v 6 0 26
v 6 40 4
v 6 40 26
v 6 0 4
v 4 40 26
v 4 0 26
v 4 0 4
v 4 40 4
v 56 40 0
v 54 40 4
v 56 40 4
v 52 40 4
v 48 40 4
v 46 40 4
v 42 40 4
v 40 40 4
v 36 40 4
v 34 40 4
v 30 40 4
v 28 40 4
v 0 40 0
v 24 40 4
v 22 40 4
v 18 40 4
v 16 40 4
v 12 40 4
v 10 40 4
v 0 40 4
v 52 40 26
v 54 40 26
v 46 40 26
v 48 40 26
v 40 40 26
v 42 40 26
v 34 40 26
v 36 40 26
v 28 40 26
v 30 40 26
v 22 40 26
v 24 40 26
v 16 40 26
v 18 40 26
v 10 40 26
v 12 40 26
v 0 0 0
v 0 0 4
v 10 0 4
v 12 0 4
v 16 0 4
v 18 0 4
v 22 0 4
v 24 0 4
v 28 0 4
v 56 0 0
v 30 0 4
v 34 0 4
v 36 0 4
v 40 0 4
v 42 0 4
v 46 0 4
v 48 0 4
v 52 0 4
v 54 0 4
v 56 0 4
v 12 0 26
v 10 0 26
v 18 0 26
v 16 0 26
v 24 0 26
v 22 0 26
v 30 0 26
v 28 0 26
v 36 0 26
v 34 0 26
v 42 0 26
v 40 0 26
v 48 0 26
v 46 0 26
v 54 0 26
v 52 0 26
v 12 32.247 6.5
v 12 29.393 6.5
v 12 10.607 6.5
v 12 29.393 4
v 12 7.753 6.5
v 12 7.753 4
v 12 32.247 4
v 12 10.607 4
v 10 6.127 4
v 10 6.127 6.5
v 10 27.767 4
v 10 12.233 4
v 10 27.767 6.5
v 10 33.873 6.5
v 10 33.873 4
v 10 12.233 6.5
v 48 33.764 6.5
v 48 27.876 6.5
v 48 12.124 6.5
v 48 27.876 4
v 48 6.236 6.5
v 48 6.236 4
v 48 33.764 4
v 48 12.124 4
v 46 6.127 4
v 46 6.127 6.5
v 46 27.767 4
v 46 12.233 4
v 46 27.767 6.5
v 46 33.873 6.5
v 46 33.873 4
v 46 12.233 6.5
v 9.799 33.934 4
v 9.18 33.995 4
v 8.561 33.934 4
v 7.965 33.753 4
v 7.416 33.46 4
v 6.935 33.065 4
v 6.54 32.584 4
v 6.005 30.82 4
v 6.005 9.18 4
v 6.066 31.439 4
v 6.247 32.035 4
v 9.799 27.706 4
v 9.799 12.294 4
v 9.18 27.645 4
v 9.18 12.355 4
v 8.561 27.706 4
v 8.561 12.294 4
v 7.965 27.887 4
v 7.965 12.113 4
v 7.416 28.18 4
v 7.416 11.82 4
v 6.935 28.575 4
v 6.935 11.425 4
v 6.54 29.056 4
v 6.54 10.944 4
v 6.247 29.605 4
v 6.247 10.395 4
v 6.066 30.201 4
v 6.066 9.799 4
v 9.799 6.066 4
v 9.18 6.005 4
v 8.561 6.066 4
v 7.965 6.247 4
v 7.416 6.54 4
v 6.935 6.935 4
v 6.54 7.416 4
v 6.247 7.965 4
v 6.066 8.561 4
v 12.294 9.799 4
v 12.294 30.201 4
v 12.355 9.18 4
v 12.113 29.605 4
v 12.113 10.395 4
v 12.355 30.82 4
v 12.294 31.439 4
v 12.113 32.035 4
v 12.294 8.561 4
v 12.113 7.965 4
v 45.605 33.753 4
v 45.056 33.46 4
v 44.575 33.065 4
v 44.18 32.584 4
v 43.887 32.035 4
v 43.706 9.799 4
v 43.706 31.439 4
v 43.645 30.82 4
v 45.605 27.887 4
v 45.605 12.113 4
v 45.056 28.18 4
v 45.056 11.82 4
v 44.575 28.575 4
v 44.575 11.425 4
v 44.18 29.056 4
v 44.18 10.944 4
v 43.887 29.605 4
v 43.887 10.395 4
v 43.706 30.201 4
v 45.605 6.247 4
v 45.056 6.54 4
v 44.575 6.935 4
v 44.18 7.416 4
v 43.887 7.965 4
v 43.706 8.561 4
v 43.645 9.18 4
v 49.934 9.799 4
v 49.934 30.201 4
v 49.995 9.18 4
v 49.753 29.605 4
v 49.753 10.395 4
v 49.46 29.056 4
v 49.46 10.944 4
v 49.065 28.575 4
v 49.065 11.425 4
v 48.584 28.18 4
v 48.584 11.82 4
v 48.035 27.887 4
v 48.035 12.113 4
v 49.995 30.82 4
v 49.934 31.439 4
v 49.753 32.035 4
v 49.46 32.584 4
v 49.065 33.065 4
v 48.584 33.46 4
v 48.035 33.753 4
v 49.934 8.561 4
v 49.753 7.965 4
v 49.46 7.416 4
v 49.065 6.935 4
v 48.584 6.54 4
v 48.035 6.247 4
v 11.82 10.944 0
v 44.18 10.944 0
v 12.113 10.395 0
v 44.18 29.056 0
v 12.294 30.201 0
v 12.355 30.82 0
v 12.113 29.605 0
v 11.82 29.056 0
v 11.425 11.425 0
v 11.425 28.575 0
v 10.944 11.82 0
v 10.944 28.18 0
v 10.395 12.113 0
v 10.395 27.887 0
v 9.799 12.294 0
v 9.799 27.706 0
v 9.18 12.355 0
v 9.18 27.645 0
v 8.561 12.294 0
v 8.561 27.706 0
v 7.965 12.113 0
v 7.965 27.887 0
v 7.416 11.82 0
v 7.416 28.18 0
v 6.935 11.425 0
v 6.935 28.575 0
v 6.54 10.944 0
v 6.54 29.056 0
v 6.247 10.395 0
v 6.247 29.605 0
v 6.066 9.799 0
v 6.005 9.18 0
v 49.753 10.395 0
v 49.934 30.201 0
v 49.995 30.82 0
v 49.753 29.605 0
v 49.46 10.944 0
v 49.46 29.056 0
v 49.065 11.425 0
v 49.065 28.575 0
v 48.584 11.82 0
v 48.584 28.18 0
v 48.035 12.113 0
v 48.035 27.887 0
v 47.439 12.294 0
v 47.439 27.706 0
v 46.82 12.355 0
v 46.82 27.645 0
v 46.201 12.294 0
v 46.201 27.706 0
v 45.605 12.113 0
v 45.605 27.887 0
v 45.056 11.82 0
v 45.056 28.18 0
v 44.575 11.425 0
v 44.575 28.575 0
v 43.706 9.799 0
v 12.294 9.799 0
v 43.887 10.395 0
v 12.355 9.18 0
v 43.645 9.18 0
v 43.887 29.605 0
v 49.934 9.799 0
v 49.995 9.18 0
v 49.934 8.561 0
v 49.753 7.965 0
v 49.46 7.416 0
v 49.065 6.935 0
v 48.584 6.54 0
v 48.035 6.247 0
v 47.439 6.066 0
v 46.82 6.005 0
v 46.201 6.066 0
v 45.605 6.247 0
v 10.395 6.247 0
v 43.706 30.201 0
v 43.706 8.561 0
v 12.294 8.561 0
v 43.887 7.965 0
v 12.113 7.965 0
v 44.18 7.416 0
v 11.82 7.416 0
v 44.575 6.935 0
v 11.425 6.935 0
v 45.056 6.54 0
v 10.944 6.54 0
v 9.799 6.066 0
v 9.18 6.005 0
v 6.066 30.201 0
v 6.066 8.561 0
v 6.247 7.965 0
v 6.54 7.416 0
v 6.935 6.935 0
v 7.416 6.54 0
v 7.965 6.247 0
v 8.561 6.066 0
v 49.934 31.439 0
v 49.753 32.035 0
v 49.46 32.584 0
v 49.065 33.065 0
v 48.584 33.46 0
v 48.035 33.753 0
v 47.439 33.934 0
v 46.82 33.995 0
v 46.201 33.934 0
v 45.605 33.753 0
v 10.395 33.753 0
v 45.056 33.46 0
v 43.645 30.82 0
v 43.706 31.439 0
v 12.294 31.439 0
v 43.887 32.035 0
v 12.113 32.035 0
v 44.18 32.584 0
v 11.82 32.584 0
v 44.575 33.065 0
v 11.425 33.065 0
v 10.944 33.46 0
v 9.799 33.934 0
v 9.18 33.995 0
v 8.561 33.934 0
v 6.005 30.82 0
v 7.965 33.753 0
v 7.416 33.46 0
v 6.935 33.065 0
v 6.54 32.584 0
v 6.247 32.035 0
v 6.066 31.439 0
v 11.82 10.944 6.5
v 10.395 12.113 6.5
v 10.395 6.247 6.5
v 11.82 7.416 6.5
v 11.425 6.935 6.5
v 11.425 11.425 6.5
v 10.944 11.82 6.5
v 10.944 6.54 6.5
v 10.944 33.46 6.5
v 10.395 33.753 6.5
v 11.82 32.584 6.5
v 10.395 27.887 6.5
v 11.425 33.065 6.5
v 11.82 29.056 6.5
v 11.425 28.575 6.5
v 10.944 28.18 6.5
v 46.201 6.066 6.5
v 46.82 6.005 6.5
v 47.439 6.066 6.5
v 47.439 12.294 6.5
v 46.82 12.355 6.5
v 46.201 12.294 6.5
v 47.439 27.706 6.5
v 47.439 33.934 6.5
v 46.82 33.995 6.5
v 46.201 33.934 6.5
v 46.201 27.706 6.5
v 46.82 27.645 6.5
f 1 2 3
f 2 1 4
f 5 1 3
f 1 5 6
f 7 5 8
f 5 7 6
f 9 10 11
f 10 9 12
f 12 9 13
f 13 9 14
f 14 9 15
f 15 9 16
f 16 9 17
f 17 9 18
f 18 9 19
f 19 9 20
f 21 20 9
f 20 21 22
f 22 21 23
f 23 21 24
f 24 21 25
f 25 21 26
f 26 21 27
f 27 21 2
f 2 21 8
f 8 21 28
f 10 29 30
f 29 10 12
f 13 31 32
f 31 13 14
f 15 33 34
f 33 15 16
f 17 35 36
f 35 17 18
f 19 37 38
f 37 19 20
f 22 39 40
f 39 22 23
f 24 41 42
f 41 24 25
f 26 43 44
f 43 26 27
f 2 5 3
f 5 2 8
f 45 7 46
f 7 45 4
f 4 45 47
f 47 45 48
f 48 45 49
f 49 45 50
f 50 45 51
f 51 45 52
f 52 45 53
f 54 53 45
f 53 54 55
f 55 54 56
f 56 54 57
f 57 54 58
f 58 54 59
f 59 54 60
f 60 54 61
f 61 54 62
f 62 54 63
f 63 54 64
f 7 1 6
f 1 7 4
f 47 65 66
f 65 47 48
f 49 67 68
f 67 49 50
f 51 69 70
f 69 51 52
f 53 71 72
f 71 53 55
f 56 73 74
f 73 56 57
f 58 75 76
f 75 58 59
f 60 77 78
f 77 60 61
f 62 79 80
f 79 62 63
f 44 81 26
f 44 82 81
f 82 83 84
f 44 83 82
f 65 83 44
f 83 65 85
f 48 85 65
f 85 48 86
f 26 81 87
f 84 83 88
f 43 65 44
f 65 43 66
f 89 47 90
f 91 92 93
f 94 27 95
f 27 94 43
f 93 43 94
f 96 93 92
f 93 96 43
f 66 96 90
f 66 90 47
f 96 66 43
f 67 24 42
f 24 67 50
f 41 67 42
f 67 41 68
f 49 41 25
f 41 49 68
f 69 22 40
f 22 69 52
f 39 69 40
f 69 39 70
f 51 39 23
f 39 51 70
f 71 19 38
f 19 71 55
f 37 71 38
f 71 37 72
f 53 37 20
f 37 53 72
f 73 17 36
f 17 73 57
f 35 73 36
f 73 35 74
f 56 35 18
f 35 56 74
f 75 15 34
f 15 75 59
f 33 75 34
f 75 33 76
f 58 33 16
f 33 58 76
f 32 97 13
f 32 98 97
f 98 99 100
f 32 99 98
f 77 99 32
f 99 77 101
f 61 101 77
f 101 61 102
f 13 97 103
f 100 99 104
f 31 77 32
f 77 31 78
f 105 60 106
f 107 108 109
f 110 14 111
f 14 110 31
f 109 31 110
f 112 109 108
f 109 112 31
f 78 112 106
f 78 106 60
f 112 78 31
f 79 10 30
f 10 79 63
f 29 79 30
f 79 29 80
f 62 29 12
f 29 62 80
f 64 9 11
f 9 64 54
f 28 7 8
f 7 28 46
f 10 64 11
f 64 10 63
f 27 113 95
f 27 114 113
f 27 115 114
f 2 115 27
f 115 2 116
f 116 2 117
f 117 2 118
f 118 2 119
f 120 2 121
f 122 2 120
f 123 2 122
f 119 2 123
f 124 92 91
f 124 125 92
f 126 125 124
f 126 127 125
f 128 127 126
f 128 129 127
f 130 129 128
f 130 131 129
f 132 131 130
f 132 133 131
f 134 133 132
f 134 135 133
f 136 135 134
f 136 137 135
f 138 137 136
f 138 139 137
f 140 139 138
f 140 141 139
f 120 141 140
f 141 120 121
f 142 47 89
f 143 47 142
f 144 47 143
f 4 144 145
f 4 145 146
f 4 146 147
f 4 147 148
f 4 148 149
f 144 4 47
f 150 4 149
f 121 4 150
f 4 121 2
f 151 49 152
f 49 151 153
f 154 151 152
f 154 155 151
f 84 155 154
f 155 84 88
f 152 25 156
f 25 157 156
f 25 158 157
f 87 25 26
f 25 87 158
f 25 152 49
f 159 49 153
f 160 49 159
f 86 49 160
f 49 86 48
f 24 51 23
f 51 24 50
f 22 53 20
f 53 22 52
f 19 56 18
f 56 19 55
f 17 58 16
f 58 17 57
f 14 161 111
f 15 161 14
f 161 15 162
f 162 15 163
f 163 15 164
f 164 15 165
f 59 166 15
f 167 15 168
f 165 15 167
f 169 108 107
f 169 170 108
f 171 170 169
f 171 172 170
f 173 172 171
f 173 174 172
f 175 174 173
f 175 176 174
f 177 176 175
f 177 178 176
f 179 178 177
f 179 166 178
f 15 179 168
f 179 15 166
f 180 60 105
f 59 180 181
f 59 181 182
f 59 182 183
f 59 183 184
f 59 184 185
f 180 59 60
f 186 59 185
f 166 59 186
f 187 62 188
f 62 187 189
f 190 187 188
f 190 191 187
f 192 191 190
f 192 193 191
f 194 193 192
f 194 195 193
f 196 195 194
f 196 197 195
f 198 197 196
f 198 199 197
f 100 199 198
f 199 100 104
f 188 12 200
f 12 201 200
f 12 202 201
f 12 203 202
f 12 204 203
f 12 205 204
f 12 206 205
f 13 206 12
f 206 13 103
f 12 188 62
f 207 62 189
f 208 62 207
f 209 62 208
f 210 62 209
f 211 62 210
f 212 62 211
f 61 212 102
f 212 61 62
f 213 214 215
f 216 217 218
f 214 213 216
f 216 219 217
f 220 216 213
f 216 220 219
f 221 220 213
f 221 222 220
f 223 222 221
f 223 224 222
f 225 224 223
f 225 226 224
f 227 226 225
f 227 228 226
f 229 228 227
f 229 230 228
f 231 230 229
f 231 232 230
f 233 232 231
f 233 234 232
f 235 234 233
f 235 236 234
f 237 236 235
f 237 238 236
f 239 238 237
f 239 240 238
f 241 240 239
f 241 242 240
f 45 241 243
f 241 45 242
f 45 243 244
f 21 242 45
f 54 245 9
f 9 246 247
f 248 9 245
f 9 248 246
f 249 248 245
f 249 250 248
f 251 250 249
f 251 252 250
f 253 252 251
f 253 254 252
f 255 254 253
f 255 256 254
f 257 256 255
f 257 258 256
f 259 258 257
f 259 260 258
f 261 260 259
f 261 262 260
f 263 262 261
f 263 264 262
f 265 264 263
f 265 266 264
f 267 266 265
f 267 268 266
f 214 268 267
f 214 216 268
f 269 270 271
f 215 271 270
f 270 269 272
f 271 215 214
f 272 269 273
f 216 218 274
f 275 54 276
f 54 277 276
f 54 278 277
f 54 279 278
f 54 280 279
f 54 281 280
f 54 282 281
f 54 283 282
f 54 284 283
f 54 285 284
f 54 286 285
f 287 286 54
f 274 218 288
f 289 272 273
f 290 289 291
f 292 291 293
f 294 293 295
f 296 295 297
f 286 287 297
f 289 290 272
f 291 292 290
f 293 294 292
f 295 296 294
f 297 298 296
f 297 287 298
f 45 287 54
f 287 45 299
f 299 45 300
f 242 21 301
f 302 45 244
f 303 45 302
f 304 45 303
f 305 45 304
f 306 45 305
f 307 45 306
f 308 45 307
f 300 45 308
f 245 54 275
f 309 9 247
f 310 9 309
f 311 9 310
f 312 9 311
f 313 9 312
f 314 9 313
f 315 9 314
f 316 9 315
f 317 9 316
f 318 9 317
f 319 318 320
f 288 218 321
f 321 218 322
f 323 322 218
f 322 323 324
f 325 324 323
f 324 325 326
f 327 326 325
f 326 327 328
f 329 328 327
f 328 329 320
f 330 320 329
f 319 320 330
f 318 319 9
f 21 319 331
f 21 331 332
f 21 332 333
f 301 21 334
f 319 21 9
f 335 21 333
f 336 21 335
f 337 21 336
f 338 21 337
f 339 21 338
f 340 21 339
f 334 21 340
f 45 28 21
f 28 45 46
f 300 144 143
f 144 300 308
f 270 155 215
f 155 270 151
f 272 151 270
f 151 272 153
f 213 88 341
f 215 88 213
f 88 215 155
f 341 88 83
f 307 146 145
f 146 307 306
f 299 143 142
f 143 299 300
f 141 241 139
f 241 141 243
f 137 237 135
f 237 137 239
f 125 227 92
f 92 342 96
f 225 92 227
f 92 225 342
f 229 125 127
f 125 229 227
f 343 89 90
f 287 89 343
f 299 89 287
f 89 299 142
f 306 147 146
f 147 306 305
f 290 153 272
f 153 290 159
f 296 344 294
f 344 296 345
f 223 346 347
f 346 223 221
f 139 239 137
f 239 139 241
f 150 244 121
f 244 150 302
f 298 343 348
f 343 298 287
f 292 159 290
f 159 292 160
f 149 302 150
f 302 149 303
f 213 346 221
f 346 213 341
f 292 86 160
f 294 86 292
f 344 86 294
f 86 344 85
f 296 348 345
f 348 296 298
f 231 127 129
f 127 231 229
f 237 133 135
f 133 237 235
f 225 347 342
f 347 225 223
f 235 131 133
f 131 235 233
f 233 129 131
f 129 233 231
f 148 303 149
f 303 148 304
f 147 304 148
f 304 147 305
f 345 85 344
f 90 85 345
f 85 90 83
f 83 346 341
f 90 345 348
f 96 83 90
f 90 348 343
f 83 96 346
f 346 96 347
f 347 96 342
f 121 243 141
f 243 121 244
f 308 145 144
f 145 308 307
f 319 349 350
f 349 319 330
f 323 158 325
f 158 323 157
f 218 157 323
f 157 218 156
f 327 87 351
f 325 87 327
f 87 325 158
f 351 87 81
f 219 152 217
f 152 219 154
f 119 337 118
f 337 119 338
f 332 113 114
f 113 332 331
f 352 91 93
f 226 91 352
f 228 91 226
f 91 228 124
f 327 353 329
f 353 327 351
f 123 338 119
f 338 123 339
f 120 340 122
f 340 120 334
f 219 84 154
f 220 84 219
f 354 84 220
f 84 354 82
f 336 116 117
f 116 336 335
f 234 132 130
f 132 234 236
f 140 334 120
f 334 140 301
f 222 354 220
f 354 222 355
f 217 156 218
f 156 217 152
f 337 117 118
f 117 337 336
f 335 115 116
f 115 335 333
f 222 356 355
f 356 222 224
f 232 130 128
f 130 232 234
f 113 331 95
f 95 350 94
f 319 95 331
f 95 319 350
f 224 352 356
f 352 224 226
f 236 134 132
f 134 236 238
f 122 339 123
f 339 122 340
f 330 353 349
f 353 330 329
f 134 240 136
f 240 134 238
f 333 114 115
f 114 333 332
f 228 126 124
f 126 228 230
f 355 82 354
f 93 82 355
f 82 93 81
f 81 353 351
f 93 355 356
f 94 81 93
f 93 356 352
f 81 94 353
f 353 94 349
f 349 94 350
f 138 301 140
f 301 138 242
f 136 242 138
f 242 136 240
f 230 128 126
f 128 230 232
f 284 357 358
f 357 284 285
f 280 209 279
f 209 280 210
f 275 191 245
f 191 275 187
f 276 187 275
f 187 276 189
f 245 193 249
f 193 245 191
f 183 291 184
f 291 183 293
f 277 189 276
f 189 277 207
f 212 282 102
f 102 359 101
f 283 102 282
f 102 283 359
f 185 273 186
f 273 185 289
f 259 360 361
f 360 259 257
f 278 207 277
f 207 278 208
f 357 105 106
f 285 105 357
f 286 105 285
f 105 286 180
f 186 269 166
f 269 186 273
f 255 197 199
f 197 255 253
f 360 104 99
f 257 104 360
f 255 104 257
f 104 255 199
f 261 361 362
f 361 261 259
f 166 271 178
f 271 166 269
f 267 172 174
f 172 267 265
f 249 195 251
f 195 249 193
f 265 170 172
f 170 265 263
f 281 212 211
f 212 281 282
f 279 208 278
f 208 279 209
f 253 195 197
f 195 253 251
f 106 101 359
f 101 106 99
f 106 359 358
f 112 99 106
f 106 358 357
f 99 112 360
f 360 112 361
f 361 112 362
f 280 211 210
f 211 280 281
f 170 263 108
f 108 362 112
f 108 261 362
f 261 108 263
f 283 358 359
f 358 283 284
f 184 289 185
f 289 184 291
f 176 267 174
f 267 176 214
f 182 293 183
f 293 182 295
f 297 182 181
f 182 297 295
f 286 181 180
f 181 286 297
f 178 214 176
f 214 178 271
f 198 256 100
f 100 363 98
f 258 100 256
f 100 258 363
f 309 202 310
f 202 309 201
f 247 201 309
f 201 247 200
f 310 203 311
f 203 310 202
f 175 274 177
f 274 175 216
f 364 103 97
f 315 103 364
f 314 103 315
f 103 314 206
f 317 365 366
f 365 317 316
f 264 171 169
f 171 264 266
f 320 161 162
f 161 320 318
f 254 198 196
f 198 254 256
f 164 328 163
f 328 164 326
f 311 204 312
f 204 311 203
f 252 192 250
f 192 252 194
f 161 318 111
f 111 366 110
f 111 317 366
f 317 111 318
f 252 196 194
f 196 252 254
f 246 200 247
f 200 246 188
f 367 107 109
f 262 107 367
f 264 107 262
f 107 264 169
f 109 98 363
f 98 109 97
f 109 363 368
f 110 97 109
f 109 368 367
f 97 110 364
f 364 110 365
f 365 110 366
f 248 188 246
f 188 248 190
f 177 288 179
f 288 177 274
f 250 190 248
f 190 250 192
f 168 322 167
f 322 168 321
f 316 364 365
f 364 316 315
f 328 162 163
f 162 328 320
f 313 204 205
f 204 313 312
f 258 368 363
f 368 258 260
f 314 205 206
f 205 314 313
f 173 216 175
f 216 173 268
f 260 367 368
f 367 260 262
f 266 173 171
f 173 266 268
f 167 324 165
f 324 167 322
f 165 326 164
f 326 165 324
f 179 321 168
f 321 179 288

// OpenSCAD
$fn = 32;

// ----------------------------------------------------------------------
// Finned heat sink: 56 x 40 mm base, 22 mm fins
// ----------------------------------------------------------------------

// --- parameters (mm) ---
base_w = 56;              // base width
base_d = 40;              // base depth
base_t = 4;               // base thickness
fin_h = 22;               // fin height above the base
holes_d = 6.35;           // fixing holes
hole_x = 18.82;           // hole offset in x
hole_y = 10.82;           // hole offset in y
fin_t = 2;                // fin thickness
fin_pitch = 6;            // fin pitch
fin_count = 9;            // number of fins
fin_x0 = 4;               // first fin offset

difference() {
  union() {
    cube([base_w, base_d, base_t]);
    for (i = [0 : fin_count - 1]) {
      translate([fin_x0 + i * fin_pitch, 0, base_t - 0.5]) cube([fin_t, base_d, fin_h + 0.5]);
    }
  }
  /* fixing holes through the base, 2.5 mm clear on both sides */
  for (hx = [-18.82, 18.82]) {
    for (hy = [-10.82, 10.82]) {
      translate([base_w / 2 + hx, base_d / 2 + hy, -2.5]) cylinder(h = base_t + 5, d = holes_d);
    }
  }
}
